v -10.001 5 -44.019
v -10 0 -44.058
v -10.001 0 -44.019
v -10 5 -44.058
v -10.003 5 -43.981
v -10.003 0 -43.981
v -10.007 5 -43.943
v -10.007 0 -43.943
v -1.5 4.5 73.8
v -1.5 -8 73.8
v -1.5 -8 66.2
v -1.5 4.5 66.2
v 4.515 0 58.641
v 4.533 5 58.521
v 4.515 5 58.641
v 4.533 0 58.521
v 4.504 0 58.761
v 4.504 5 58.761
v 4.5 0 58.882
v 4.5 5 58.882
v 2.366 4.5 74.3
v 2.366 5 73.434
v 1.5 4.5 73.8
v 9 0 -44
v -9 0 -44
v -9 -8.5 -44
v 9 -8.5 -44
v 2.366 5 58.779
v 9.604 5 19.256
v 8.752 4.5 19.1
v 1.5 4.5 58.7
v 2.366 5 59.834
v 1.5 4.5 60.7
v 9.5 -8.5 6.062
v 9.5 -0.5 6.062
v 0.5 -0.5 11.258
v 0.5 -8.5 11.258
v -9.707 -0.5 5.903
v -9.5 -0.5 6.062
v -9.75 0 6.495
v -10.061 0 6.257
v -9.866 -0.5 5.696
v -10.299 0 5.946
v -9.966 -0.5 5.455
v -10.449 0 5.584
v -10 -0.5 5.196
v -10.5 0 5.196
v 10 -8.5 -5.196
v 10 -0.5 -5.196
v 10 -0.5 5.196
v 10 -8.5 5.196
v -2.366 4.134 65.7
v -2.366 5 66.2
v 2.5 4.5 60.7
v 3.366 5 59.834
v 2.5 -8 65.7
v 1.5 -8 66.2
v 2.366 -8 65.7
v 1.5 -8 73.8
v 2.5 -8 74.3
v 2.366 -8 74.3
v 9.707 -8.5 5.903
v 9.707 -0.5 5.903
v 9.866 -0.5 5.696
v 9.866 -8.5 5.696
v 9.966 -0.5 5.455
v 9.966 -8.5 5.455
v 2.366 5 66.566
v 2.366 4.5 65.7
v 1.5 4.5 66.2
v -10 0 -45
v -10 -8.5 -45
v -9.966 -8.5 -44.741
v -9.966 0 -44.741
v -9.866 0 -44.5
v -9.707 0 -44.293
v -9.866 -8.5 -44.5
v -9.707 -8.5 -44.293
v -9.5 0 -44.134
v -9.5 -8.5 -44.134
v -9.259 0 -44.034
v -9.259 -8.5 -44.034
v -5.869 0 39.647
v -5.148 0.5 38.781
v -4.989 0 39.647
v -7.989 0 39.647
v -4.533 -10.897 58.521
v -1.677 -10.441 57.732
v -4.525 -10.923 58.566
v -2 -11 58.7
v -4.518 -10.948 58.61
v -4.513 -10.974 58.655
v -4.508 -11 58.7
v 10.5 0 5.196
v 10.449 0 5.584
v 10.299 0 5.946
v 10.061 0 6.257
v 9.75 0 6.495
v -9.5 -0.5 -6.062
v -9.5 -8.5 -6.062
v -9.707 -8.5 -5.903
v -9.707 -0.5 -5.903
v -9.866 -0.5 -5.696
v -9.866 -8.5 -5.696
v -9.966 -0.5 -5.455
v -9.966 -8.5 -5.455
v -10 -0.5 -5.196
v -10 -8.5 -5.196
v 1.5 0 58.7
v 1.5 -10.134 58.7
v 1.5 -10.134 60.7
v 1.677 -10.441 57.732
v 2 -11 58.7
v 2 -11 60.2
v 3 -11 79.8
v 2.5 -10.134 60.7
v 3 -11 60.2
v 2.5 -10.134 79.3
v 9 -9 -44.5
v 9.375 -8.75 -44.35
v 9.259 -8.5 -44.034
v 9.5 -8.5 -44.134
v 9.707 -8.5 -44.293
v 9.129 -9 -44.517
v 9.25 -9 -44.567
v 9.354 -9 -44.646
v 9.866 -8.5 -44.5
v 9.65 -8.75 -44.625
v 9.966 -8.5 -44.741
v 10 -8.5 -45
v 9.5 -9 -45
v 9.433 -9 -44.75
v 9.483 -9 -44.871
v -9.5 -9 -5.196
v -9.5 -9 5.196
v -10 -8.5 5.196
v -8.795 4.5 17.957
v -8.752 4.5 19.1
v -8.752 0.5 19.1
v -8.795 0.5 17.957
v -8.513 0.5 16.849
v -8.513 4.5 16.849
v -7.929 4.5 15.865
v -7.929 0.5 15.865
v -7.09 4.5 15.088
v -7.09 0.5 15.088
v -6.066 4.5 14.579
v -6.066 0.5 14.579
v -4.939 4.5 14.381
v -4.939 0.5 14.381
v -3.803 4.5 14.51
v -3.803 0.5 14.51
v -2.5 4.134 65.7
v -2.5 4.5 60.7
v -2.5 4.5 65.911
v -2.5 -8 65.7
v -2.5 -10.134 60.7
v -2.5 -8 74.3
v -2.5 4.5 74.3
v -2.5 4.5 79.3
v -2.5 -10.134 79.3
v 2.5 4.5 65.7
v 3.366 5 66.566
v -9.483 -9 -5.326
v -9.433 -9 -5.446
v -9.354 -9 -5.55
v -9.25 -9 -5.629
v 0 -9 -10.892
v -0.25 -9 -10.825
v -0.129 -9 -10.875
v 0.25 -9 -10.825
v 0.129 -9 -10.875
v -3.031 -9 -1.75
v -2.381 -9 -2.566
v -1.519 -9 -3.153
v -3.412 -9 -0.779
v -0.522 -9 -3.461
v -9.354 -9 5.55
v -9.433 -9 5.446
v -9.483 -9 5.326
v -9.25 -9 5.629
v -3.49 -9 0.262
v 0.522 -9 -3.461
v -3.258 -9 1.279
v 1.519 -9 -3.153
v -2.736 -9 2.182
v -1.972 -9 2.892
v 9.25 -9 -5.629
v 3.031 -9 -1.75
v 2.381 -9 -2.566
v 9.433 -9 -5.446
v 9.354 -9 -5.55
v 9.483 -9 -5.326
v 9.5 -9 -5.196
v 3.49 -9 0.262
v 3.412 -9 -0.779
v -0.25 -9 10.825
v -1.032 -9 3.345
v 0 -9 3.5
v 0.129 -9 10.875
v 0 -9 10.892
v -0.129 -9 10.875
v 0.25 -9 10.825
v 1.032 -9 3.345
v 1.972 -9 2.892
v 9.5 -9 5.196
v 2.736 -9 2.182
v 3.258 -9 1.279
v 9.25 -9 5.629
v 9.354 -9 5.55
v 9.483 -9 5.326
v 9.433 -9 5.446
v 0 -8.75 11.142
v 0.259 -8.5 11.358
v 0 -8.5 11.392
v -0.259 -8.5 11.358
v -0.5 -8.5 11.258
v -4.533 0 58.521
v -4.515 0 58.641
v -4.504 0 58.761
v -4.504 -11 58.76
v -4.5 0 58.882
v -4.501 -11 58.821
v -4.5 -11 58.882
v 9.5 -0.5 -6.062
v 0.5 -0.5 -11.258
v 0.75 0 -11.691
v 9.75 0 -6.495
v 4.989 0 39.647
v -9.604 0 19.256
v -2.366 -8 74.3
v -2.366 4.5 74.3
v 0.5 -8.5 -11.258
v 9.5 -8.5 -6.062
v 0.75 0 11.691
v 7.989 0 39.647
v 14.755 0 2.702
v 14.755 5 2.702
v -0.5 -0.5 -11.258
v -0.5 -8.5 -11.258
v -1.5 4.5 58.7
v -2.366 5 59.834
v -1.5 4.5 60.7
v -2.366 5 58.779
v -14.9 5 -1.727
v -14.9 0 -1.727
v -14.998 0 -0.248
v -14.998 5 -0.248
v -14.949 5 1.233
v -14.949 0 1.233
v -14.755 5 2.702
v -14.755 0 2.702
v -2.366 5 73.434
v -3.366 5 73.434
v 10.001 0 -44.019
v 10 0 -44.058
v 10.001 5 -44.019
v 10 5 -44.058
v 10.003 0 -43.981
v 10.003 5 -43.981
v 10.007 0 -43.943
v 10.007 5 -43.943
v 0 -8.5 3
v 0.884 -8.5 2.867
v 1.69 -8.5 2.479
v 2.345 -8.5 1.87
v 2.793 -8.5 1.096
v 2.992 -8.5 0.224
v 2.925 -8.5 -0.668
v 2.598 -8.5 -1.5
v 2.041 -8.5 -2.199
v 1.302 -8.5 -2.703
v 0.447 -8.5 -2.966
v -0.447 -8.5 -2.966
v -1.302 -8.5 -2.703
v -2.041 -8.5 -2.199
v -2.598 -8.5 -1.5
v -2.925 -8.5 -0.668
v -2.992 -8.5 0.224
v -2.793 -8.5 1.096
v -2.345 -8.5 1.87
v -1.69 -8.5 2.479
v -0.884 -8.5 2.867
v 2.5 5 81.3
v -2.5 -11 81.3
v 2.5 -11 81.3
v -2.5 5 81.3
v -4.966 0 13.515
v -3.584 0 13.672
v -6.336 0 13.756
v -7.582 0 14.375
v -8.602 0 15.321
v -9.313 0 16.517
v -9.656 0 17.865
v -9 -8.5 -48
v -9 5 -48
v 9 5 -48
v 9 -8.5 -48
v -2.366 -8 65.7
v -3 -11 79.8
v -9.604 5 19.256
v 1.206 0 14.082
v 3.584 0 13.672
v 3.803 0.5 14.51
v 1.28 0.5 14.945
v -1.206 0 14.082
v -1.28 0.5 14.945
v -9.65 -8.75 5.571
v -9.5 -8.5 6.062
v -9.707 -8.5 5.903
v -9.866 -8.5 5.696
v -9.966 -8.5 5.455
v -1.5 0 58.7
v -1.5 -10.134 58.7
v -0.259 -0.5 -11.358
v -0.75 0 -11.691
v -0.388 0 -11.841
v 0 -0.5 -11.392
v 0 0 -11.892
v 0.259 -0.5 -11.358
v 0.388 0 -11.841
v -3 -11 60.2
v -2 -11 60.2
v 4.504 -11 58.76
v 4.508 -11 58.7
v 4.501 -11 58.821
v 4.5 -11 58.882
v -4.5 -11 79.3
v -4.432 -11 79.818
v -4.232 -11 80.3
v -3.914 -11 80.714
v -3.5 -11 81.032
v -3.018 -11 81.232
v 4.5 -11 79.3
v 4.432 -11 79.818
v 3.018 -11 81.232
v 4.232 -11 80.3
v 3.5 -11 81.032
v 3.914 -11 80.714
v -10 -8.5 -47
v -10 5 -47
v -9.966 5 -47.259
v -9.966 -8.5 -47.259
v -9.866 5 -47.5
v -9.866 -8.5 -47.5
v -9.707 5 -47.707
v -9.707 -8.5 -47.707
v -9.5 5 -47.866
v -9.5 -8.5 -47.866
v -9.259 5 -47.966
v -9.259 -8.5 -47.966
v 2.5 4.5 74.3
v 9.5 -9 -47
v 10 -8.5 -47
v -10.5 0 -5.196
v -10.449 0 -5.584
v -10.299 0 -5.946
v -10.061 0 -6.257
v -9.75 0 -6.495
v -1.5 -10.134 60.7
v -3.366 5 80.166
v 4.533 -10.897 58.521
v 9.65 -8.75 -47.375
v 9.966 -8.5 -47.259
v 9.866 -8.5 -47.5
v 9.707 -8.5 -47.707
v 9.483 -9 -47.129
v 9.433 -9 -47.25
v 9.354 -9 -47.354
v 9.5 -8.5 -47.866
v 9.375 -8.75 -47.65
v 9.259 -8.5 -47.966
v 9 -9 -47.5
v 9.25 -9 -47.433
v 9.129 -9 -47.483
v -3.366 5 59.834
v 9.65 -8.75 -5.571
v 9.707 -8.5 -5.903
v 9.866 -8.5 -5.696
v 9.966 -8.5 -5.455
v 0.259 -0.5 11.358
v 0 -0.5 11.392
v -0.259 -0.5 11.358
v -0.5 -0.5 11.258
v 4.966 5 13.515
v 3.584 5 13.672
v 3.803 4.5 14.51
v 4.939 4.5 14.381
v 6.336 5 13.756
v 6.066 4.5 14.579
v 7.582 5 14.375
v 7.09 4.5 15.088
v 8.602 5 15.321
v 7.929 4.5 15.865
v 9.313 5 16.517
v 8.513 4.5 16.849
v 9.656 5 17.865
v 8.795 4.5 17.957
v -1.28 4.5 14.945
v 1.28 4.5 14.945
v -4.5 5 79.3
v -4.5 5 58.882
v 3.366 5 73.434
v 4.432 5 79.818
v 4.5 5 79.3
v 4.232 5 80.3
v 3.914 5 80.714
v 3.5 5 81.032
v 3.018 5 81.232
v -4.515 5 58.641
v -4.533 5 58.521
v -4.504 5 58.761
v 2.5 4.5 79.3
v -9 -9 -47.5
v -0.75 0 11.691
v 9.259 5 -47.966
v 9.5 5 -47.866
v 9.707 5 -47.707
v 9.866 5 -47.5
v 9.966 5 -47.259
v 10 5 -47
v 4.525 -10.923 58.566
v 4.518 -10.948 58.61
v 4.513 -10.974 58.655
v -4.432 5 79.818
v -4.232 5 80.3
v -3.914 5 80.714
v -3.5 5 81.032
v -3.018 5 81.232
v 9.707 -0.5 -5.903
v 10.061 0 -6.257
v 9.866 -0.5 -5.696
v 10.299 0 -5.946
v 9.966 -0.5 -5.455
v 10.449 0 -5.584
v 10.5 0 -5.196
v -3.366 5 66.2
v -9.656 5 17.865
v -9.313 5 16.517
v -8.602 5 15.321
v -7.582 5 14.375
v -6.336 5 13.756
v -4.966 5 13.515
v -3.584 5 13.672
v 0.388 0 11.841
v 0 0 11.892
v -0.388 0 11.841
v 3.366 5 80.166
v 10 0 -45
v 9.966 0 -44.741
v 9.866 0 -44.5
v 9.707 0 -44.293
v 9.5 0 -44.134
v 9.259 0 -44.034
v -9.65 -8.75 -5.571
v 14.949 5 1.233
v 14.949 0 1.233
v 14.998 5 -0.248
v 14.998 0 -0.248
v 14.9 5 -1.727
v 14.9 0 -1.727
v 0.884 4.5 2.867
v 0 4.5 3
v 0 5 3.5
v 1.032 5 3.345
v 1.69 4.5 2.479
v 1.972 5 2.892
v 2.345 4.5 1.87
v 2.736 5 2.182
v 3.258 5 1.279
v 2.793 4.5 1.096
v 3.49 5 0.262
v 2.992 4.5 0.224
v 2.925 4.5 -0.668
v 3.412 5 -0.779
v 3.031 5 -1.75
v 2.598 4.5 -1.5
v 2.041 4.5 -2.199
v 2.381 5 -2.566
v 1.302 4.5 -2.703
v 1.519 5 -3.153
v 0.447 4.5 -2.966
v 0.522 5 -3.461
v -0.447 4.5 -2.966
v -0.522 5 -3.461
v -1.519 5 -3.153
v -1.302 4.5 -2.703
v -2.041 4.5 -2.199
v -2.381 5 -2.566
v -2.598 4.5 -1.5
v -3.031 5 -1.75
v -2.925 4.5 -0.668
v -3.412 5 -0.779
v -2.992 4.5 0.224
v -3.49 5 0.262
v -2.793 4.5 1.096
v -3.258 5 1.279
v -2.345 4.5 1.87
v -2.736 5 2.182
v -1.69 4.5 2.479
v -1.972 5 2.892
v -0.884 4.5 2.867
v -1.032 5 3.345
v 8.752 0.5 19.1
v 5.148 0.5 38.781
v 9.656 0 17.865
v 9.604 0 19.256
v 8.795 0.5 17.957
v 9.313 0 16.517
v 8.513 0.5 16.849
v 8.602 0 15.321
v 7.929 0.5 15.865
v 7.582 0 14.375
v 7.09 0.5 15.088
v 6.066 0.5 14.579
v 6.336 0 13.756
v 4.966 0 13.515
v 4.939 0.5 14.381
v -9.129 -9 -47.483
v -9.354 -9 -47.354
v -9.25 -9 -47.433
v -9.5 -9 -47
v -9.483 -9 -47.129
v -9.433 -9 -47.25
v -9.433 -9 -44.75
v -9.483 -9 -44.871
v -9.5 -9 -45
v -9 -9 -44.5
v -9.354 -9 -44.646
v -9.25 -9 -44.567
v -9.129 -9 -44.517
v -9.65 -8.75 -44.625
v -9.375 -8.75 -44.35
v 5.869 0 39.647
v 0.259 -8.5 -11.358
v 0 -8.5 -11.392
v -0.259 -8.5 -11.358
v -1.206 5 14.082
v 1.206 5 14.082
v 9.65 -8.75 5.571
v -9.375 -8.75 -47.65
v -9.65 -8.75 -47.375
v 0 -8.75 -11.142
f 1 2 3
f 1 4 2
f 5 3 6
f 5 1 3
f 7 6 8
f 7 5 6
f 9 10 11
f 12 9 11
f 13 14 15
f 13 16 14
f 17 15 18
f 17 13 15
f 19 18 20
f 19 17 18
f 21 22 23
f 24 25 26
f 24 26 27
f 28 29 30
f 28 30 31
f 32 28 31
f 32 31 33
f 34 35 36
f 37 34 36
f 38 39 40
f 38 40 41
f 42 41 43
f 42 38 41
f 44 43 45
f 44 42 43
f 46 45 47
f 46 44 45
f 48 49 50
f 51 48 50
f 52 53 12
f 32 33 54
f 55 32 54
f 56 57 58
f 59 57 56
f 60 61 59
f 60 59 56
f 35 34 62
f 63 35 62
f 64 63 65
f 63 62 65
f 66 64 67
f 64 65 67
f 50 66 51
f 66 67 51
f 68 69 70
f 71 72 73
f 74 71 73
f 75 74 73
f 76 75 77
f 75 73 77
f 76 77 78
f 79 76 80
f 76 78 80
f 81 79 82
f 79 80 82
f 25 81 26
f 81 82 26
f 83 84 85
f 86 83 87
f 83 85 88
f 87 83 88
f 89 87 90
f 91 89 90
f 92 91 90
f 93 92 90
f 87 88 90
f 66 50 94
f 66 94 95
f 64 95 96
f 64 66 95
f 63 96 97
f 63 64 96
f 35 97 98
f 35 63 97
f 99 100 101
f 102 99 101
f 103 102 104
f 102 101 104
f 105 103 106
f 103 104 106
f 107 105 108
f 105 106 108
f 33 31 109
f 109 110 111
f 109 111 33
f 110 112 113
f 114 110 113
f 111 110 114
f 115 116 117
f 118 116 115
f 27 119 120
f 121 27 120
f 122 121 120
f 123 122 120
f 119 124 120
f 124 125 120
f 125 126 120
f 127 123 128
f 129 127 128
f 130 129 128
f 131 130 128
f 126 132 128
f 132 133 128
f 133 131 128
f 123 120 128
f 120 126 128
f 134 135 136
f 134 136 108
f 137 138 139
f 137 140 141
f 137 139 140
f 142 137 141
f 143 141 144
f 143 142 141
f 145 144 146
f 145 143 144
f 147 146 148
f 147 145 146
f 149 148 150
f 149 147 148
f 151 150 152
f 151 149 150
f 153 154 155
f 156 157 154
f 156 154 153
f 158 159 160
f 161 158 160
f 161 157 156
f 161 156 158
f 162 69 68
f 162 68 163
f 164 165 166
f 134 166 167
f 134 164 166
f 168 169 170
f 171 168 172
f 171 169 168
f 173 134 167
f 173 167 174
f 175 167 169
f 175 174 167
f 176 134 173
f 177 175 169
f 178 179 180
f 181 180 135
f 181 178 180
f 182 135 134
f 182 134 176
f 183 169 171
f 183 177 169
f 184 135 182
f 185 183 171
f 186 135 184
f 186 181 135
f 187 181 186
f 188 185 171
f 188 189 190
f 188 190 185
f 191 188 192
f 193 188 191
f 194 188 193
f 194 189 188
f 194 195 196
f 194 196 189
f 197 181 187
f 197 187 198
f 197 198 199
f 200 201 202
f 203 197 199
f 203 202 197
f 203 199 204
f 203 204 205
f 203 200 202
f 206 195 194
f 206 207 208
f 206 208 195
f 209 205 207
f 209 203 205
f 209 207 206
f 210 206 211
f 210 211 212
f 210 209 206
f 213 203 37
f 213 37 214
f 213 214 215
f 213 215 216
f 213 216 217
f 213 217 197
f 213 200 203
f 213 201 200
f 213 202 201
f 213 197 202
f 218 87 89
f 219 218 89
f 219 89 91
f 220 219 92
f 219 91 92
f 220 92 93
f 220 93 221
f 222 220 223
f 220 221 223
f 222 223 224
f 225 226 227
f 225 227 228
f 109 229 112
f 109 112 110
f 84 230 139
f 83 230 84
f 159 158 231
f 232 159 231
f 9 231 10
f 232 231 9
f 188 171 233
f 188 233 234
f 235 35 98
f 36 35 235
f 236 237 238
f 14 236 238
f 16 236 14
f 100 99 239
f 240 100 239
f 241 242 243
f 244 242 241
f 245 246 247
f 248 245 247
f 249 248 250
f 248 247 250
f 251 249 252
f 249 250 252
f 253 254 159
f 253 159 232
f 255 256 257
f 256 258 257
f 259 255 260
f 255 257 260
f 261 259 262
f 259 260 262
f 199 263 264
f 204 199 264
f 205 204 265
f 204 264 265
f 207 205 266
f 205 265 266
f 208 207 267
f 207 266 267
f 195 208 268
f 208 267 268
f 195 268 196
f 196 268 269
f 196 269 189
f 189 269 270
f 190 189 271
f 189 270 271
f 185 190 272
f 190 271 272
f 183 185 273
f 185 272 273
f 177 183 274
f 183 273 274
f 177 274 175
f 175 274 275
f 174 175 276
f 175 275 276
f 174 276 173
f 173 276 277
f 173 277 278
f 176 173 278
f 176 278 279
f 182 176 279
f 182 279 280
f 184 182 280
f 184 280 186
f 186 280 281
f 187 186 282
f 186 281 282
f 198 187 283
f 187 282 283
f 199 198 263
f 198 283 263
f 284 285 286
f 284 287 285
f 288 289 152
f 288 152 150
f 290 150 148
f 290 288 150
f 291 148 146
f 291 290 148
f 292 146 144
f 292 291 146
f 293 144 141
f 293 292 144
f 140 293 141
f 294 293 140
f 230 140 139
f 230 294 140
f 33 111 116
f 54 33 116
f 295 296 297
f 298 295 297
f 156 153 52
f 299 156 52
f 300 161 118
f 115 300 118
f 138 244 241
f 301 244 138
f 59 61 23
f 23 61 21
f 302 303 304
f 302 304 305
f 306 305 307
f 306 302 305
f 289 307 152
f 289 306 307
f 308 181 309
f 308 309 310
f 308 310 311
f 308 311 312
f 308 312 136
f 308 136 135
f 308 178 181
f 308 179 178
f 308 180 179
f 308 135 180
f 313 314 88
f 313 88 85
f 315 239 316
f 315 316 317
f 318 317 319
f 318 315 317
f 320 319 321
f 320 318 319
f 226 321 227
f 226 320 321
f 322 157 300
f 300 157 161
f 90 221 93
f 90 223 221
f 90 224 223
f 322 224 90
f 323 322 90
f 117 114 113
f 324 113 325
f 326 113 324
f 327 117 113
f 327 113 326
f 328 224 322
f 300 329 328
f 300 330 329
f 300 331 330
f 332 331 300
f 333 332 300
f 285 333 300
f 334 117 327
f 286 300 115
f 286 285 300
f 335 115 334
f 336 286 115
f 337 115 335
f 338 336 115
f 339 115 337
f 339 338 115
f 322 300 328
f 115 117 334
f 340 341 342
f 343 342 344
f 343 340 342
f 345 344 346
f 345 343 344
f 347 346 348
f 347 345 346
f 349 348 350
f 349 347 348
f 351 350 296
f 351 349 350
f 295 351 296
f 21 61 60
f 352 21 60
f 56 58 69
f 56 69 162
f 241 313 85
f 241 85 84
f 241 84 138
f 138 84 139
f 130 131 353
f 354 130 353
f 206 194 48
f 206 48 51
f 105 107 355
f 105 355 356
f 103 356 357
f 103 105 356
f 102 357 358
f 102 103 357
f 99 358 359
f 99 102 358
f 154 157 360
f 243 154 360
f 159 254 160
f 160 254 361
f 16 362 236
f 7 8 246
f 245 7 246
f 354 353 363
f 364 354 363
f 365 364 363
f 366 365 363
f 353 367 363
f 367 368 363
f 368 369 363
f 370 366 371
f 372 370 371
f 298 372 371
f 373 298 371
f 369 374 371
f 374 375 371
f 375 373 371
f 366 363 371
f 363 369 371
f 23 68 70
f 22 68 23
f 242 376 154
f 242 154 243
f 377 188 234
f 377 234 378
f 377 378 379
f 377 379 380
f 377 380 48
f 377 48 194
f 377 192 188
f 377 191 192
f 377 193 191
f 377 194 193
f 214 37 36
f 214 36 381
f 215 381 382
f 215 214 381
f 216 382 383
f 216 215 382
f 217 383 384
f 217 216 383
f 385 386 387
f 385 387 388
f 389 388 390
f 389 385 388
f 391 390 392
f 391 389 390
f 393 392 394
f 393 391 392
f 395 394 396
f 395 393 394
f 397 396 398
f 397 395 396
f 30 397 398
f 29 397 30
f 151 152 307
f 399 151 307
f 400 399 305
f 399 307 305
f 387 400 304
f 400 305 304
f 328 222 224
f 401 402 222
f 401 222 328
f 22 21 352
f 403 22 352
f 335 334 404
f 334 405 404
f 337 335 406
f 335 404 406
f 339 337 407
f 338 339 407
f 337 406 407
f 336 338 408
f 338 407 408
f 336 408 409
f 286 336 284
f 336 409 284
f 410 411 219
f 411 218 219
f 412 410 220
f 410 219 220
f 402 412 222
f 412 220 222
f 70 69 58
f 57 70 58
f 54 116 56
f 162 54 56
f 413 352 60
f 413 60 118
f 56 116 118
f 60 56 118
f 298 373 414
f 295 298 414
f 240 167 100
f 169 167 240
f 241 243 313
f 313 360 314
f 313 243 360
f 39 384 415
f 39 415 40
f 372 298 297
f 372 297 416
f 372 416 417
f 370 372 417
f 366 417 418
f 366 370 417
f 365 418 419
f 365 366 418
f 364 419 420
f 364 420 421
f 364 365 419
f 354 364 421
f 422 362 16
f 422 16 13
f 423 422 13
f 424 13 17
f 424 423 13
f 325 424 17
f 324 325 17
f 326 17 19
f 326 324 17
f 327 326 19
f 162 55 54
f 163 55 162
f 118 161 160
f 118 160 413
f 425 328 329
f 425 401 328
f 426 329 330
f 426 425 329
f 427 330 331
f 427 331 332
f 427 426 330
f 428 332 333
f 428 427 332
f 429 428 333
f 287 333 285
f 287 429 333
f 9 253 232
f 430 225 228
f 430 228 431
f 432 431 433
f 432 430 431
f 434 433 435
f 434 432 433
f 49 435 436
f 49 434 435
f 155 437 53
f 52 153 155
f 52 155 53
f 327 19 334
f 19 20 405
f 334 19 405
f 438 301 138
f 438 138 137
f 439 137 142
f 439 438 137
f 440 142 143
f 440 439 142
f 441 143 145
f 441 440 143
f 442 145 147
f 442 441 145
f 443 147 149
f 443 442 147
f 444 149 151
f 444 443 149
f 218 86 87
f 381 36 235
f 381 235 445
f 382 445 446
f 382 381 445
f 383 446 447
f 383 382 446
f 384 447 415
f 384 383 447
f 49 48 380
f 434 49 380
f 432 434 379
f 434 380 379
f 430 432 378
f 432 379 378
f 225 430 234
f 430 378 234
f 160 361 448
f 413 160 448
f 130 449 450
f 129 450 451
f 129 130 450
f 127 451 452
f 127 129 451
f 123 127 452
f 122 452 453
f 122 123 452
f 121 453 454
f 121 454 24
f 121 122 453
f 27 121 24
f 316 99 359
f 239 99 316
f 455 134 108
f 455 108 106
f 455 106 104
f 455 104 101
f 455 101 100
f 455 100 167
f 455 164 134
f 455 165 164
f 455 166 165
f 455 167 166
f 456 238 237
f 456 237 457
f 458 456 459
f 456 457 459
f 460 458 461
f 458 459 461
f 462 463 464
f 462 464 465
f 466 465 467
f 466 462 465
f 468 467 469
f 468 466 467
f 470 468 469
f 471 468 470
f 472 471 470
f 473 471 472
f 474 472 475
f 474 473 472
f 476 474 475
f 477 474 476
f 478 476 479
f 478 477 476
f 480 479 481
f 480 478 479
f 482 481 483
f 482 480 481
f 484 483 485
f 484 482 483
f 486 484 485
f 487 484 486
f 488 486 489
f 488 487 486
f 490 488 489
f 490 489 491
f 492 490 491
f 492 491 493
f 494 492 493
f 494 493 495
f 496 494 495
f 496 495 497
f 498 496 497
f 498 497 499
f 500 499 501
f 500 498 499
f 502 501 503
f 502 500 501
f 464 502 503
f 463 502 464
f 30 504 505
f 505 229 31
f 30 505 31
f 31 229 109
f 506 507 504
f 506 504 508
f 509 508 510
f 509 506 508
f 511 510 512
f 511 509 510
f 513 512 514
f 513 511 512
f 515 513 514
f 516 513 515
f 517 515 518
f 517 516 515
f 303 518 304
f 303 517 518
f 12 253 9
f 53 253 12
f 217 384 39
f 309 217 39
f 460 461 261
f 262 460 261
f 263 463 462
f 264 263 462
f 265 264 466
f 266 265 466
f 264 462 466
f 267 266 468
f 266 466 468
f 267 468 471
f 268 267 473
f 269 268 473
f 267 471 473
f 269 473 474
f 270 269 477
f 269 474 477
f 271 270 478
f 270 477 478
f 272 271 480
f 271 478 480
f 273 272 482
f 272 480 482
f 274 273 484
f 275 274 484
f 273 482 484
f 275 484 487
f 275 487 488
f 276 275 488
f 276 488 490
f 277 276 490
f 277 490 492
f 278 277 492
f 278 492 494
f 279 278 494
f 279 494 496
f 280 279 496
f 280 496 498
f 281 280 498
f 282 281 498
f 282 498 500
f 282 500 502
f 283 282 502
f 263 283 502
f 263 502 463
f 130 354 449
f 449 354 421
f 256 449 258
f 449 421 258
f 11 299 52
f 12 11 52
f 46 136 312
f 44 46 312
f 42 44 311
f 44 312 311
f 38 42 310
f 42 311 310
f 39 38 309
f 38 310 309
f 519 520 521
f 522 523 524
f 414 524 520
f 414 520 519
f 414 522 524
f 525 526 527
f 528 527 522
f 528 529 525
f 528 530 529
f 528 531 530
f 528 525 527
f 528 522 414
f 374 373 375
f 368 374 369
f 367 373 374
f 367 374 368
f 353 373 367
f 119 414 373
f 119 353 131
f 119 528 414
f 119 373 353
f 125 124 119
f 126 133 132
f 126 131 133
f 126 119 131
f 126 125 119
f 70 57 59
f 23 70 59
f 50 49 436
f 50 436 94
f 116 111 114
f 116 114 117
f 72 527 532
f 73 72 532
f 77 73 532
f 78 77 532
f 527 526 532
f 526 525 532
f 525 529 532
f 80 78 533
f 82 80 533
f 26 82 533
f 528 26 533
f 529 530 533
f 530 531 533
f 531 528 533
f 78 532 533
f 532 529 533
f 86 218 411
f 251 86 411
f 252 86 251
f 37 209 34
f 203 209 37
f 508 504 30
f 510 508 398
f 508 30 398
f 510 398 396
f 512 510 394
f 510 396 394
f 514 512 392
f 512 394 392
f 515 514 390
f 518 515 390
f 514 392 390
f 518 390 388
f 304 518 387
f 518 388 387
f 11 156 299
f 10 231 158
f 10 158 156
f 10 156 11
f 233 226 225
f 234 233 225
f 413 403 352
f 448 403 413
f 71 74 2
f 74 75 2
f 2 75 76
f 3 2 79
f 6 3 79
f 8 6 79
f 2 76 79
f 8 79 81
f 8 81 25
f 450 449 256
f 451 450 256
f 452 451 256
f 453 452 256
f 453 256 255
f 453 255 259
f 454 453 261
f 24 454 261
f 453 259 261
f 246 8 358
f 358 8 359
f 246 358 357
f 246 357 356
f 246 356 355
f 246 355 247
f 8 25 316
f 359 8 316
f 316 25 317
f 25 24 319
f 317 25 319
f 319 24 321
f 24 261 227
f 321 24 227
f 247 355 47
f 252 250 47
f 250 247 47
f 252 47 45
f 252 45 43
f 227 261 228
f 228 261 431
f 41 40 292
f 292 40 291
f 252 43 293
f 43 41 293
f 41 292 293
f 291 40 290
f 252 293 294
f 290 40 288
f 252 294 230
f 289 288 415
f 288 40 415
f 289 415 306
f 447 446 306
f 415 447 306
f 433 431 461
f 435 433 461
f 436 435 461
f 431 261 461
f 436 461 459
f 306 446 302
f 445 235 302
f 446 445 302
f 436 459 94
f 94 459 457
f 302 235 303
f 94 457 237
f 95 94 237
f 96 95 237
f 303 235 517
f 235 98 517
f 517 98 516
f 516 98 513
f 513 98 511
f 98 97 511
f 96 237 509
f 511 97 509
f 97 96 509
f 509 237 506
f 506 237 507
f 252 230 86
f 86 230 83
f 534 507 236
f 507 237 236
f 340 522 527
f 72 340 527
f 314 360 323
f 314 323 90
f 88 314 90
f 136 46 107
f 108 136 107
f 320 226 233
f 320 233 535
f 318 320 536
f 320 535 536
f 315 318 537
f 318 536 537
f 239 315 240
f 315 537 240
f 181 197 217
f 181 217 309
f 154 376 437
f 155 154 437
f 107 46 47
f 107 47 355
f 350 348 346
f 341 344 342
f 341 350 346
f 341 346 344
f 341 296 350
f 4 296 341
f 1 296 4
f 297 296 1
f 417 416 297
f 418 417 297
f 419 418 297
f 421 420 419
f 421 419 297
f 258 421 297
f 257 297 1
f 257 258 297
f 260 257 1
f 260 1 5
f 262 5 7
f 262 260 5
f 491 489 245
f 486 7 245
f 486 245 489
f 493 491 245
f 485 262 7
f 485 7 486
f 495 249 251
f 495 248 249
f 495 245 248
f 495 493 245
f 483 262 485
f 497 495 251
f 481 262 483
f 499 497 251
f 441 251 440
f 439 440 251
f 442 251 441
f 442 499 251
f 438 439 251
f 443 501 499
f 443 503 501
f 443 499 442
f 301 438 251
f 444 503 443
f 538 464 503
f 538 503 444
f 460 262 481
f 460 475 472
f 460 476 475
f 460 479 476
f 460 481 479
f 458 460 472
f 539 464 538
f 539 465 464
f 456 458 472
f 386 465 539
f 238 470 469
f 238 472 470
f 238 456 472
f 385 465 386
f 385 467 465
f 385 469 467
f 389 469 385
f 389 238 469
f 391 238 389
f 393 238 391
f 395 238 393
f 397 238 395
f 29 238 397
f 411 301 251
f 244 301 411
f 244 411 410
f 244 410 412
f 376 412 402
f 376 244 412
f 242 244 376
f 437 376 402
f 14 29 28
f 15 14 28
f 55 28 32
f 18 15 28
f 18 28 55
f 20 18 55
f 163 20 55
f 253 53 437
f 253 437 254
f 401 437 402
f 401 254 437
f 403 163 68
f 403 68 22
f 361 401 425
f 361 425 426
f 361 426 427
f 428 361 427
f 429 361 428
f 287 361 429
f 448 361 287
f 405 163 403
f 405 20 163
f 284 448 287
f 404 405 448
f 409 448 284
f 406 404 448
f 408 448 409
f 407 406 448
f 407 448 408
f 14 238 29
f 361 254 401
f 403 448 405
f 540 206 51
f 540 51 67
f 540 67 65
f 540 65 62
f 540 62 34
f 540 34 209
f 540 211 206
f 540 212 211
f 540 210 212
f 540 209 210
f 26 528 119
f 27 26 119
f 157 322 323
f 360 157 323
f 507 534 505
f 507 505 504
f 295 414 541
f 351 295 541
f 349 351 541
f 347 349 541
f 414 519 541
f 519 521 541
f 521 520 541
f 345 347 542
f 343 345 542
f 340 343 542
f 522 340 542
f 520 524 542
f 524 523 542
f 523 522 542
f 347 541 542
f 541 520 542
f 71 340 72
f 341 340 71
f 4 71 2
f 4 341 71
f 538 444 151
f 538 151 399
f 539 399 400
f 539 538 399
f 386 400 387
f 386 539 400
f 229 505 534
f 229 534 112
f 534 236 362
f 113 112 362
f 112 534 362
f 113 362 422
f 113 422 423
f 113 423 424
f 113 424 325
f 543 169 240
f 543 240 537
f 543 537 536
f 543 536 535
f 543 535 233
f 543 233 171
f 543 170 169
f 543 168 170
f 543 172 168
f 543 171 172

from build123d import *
from OCP.BRepFilletAPI import BRepFilletAPI_MakeChamfer

# Parameters (mm, degrees)
SKETCH1_R           = 15
BOSS_EXTRUDE1_DEPTH = 5
BOSS_EXTRUDE2_DEPTH = 9
CUT_EXTRUDE1_REACH  = 27.417
SKETCH3_R           = 3
FILLET1_R           = 1
CHAMFER1_SIZE       = 0.5
BOSS_EXTRUDE3_START = -5
BOSS_EXTRUDE3_DEPTH = 5
SKETCH5_W           = 20
SKETCH5_H           = 4
BOSS_EXTRUDE4_DEPTH = 9
FILLET2_R           = 1
CHAMFER3_SIZE       = 0.5
FILLET3_R           = 1
BOSS_EXTRUDE5_START = -5
BOSS_EXTRUDE5_DEPTH = 5
SKETCH7_W           = 9
SKETCH7_H           = 22.6
BOSS_EXTRUDE6_DEPTH = 11
SKETCH8_W           = 5
SKETCH8_H           = 18.6
CUT_EXTRUDE2_DEPTH  = 3
CUT_EXTRUDE4_REACH  = 85.688
SKETCH10_W          = 5
SKETCH10_H          = 5
CUT_EXTRUDE5_DEPTH  = 16
CHAMFER5_SIZE       = 19.052558883
CHAMFER5_SIZE_2     = 11
FILLET4_R           = 4
CHAMFER6_SIZE       = 0.5
CHAMFER6_SIZE2      = 0.866025404
FILLET5_R           = 2


with BuildPart() as part:
    # Sketch1 → Boss-Extrude1 (new body)
    with BuildSketch(Plane(origin=(0, 0, 0), x_dir=(1, 0, 0), z_dir=(0, 1, 0))):
        with Locations(Location((0, 0, 0), (0, 0, 270))):
            Circle(SKETCH1_R)
    extrude(amount=BOSS_EXTRUDE1_DEPTH)

    # Sketch2 → Boss-Extrude2 (add)
    with BuildSketch(Plane.XZ):
        Polygon((0, 11.547005384), (-10, 5.773502692), (-10, -5.773502692), (0, -11.547005384), (10, -5.773502692), (10, 5.773502692), align=None)
    extrude(amount=BOSS_EXTRUDE2_DEPTH)

    # Sketch3 → Cut-Extrude1 (cut, up to next)
    with BuildSketch(Plane(origin=(0, 5, 0), x_dir=(1, 0, 0), z_dir=(0, 1, 0)), mode=Mode.PRIVATE) as cut_extrude1_sk1:
        with Locations(Location((0, 0, 0), (0, 0, 270))):
            Circle(SKETCH3_R)
    cut_extrude1_tool1 = extrude(cut_extrude1_sk1.sketch, amount=-CUT_EXTRUDE1_REACH, mode=Mode.PRIVATE) & part.part
    add(cut_extrude1_tool1.solids().sort_by_distance((0, 5, 0))[0], mode=Mode.SUBTRACT)

    # Fillet1
    fillet1_edges = [part.edges().sort_by_distance(p)[0] for p in [
        (10, -4.5, 5.773502692),
        (0, -4.5, 11.547005384),
        (-10, -4.5, 5.773502692),
        (-10, -4.5, -5.773502692),
        (0, -4.5, -11.547005384),
        (10, -4.5, -5.773502692),
    ]]
    fillet(fillet1_edges, radius=FILLET1_R)

    # Chamfer1
    chamfer1_edges = [part.edges().sort_by_distance(p)[0] for p in [
        (0, -9, -3),
        (0, 5, -3),
        (-5, 0, -8.660254038),
        (-5, -9, -8.660254038),
        (-10, 0, 0),
        (-10, -9, 0),
        (5, -9, 8.660254038),
        (-5, -9, 8.660254038),
        (5, -9, -8.660254038),
        (10, -9, 0),
        (-9.866025404, -9, 5.696152423),
        (0, -9, 11.392304845),
        (9.866025404, -9, 5.696152423),
        (9.866025404, -9, -5.696152423),
        (0, -9, -11.392304845),
        (-9.866025404, -9, -5.696152423),
        (5, 0, -8.660254038),
        (10, 0, 0),
        (5, 0, 8.660254038),
        (-5, 0, 8.660254038),
        (-9.866025404, 0, -5.696152423),
        (0, 0, -11.392304845),
        (9.866025404, 0, -5.696152423),
        (9.866025404, 0, 5.696152423),
        (0, 0, 11.392304845),
        (-9.866025404, 0, 5.696152423),
    ]]
    chamfer(chamfer1_edges, length=CHAMFER1_SIZE)

    # Sketch4 → Boss-Extrude3 (add)
    with BuildSketch(Plane(origin=(0, 5, 0), x_dir=(1, 0, 0), z_dir=(0, 1, 0)).offset(BOSS_EXTRUDE3_START)):
        with BuildLine():
            Line((10, 48), (-10, 48))
            Line((-10, 48), (-10, 44))
            Line((-10, 44), (-14.900225018, 1.727221587))
            ThreePointArc((-14.900225018, 1.727221587), (0, 15), (14.900225018, 1.727221587))
            Line((14.900225018, 1.727221587), (10, 44))
            Line((10, 44), (10, 48))
        make_face()
    extrude(amount=BOSS_EXTRUDE3_DEPTH)

    # Sketch5 → Boss-Extrude4 (add)
    with BuildSketch(Plane.XZ):
        with Locations((0, -46)):
            Rectangle(SKETCH5_W, SKETCH5_H)
    extrude(amount=BOSS_EXTRUDE4_DEPTH)

    # Fillet2
    fillet2_edges = [part.edges().sort_by_distance(p)[0] for p in [
        (-10, -2, -48),
        (10, -2, -48),
        (-10, -4.5, -44),
        (10, -4.5, -44),
    ]]
    fillet(fillet2_edges, radius=FILLET2_R)

    # Chamfer3
    chamfer3_edges = [part.edges().sort_by_distance(p)[0] for p in [
        (-10, -9, -46),
        (0, -9, -44),
        (0, -9, -48),
        (10, -9, -46),
        (-9.707106781, -9, -47.707106781),
        (9.707106781, -9, -47.707106781),
        (9.707106781, -9, -44.292893219),
        (-9.707106781, -9, -44.292893219),
    ]]
    chamfer(chamfer3_edges, length=CHAMFER3_SIZE)

    # Fillet3
    fillet3_edges = [part.edges().sort_by_distance(p)[0] for p in [
        (-10, 2.5, -44),
        (10, 2.5, -44),
    ]]
    fillet(fillet3_edges, radius=FILLET3_R)

    # Sketch6 → Boss-Extrude5 (add)
    with BuildSketch(Plane(origin=(0, 5, 0), x_dir=(1, 0, 0), z_dir=(0, 1, 0)).offset(BOSS_EXTRUDE5_START)):
        with BuildLine():
            Line((4.5, -58.7), (4.5, -81.3))
            Line((4.5, -81.3), (-4.5, -81.3))
            Line((-4.5, -81.3), (-4.5, -58.7))
            Line((-4.5, -58.7), (-14.754643314, -2.701943869))
            ThreePointArc((-14.754643314, -2.701943869), (0, -15), (14.754643314, -2.701943869))
            Line((14.754643314, -2.701943869), (4.5, -58.7))
        make_face()
    extrude(amount=BOSS_EXTRUDE5_DEPTH)

    # Sketch7 → Boss-Extrude6 (add)
    with BuildSketch(Plane.XZ):
        with Locations((0, 70)):
            Rectangle(SKETCH7_W, SKETCH7_H)
    extrude(amount=BOSS_EXTRUDE6_DEPTH)

    # Sketch8 → Cut-Extrude2 (cut)
    with BuildSketch(Plane.XZ.offset(11)):
        with Locations((0, 70)):
            Rectangle(SKETCH8_W, SKETCH8_H)
    extrude(amount=-CUT_EXTRUDE2_DEPTH, mode=Mode.SUBTRACT)

    # Sketch10 → Cut-Extrude4 (cut, up to next)
    with BuildSketch(Plane.XZ.offset(8), mode=Mode.PRIVATE) as cut_extrude4_sk1:
        with Locations((0, 76.8)):
            Rectangle(SKETCH10_W, SKETCH10_H)
    cut_extrude4_tool1 = extrude(cut_extrude4_sk1.sketch, amount=-CUT_EXTRUDE4_REACH, mode=Mode.PRIVATE) & part.part
    # Sketch10 → Cut-Extrude4 (cut, up to next)
    with BuildSketch(Plane.XZ.offset(8), mode=Mode.PRIVATE) as cut_extrude4_sk2:
        with Locations((0, 63.2)):
            Rectangle(SKETCH10_W, SKETCH10_H)
    cut_extrude4_tool2 = extrude(cut_extrude4_sk2.sketch, amount=-CUT_EXTRUDE4_REACH, mode=Mode.PRIVATE) & part.part
    add(cut_extrude4_tool1.solids().sort_by_distance((0, -8, 76.8))[0], mode=Mode.SUBTRACT)
    add(cut_extrude4_tool2.solids().sort_by_distance((0, -8, 63.2))[0], mode=Mode.SUBTRACT)

    # Sketch11 → Cut-Extrude5 (cut)
    with BuildSketch(Plane.XZ.offset(11)):
        with BuildLine():
            Line((-1.5, 74.3), (-1.5, 58.7))
            Line((-1.5, 58.7), (-10.24267003, 10.958453844))
            ThreePointArc((-10.24267003, 10.958453844), (0, 15), (10.24267003, 10.958453844))
            Line((10.24267003, 10.958453844), (1.5, 58.7))
            Line((1.5, 58.7), (1.5, 74.3))
            Line((1.5, 74.3), (-1.5, 74.3))
        make_face()
    extrude(amount=-CUT_EXTRUDE5_DEPTH, mode=Mode.SUBTRACT)

    # Chamfer5
    # the kernel refuses this chamfer: 19.052558883, 11 mm, written as the material it adds along each edge
    with BuildSketch(Plane(origin=(47.790603676, 0, 58.7), x_dir=(0, 0.01932676561270063, -0.9998132206222079), z_dir=(-1, 0, 0))) as chamfer5_piece_1_section:
        Polygon((CHAMFER5_SIZE * 0.999813220636, CHAMFER5_SIZE * 0.019326765613), (-CHAMFER5_SIZE_2 * 0.0193267656127, CHAMFER5_SIZE_2 * 0.999813220622), (0, 0), align=None)
    chamfer5_piece_1 = extrude(amount=101.581207353, mode=Mode.PRIVATE)
    chamfer5_piece_1 = split(chamfer5_piece_1, bisect_by=Plane(origin=(6.212258684, -2.756527894, 49.349781279), z_dir=(-0.9836428876173074, 0, -0.18012959123887753)), keep=Keep.TOP, mode=Mode.PRIVATE)
    chamfer5_piece_1 = split(chamfer5_piece_1, bisect_by=Plane(origin=(3.309598693, -2.756527894, 48.818231705), z_dir=(0.9836428876173074, 0, 0.18012959123887784)), keep=Keep.TOP, mode=Mode.PRIVATE)
    add(chamfer5_piece_1)
    with BuildSketch(Plane(origin=(47.790603676, 0, 58.7), x_dir=(0, 0.01932676561270063, -0.9998132206222079), z_dir=(-1, 0, 0))) as chamfer5_piece_2_section:
        Polygon((CHAMFER5_SIZE * 0.999813220636, CHAMFER5_SIZE * 0.019326765613), (-CHAMFER5_SIZE_2 * 0.0193267656127, CHAMFER5_SIZE_2 * 0.999813220622), (0, 0), align=None)
    chamfer5_piece_2 = extrude(amount=101.581207353, mode=Mode.PRIVATE)
    chamfer5_piece_2 = split(chamfer5_piece_2, bisect_by=Plane(origin=(-2.334821756, -4.240286921, 54.141246068), z_dir=(-0.9836428876173074, 0, 0.18012959123887784)), keep=Keep.TOP, mode=Mode.PRIVATE)
    chamfer5_piece_2 = split(chamfer5_piece_2, bisect_by=Plane(origin=(-5.237481747, -4.240286921, 54.672795642), z_dir=(0.9836428876173074, 0, -0.18012959123887773)), keep=Keep.TOP, mode=Mode.PRIVATE)
    add(chamfer5_piece_2)
    with BuildSketch(Plane(origin=(53.790603676, 0, 58.7), x_dir=(0, 0.01932676561270063, -0.9998132206222079), z_dir=(-1, 0, 0))) as chamfer5_piece_3_section:
        Polygon((CHAMFER5_SIZE * 0.999813220636, CHAMFER5_SIZE * 0.019326765613), (-CHAMFER5_SIZE_2 * 0.0193267656127, CHAMFER5_SIZE_2 * 0.999813220622), (0, 0), align=None)
    chamfer5_piece_3 = extrude(amount=101.581207353, mode=Mode.PRIVATE)
    chamfer5_piece_3 = split(chamfer5_piece_3, bisect_by=Plane(origin=(6.212258684, -2.756527894, 49.349781279), z_dir=(-0.9836428876173074, 0, -0.18012959123887753)), keep=Keep.TOP, mode=Mode.PRIVATE)
    chamfer5_piece_3 = split(chamfer5_piece_3, bisect_by=Plane(origin=(3.309598693, -2.756527894, 48.818231705), z_dir=(0.9836428876173074, 0, 0.18012959123887784)), keep=Keep.TOP, mode=Mode.PRIVATE)
    add(chamfer5_piece_3)
    with BuildSketch(Plane(origin=(53.790603676, 0, 58.7), x_dir=(0, 0.01932676561270063, -0.9998132206222079), z_dir=(-1, 0, 0))) as chamfer5_piece_4_section:
        Polygon((CHAMFER5_SIZE * 0.999813220636, CHAMFER5_SIZE * 0.019326765613), (-CHAMFER5_SIZE_2 * 0.0193267656127, CHAMFER5_SIZE_2 * 0.999813220622), (0, 0), align=None)
    chamfer5_piece_4 = extrude(amount=101.581207353, mode=Mode.PRIVATE)
    chamfer5_piece_4 = split(chamfer5_piece_4, bisect_by=Plane(origin=(-2.334821756, -4.240286921, 54.141246068), z_dir=(-0.9836428876173074, 0, 0.18012959123887784)), keep=Keep.TOP, mode=Mode.PRIVATE)
    chamfer5_piece_4 = split(chamfer5_piece_4, bisect_by=Plane(origin=(-5.237481747, -4.240286921, 54.672795642), z_dir=(0.9836428876173074, 0, -0.18012959123887773)), keep=Keep.TOP, mode=Mode.PRIVATE)
    add(chamfer5_piece_4)

    # Fillet4
    fillet4_edges = [part.edges().sort_by_distance(p)[0] for p in [
        (10.24267003, 2.5, 10.958453844),
        (-10.24267003, 2.5, 10.958453844),
    ]]
    fillet(fillet4_edges, radius=FILLET4_R)

    # Chamfer6: one chamfer whose edges measure the first distance from different faces: ONE call of the kernel's chamfer builder (chamfer() names one face for all edges)
    chamfer6_edges_1 = [part.edges().sort_by_distance(p)[0] for p in [
        (0, -11, 79.3),
        (-2.5, -11, 70),
        (-2, -11, 60.7),
        (2.5, -11, 70),
        (2, -11, 60.7),
        (-1.5, -11, 59.7),
        (1.5, -11, 59.7),
    ]]
    chamfer6_side_1 = [part.faces().sort_by_distance(p)[0] for p in [
        (-4.256738823, -11, 70),
    ]]
    chamfer6_edges_2 = [part.edges().sort_by_distance(p)[0] for p in [
        (-2.5, 5, 76.8),
        (-2.5, 5, 63.2),
    ]]
    chamfer6_side_2 = [part.faces().sort_by_distance(p)[0] for p in [
        (-2.5, -3, 79.054651269),
    ]]
    chamfer6_edges_3 = [part.edges().sort_by_distance(p)[0] for p in [
        (0, 5, 79.3),
    ]]
    chamfer6_side_3 = [part.faces().sort_by_distance(p)[0] for p in [
        (0, -3, 79.3),
    ]]
    chamfer6_edges_4 = [part.edges().sort_by_distance(p)[0] for p in [
        (2.5, 5, 76.8),
        (2.5, 5, 63.2),
    ]]
    chamfer6_side_4 = [part.faces().sort_by_distance(p)[0] for p in [
        (2.5, -1.5, 74.545348731),
    ]]
    chamfer6_edges_5 = [part.edges().sort_by_distance(p)[0] for p in [
        (-2, 5, 74.3),
    ]]
    chamfer6_side_5 = [part.faces().sort_by_distance(p)[0] for p in [
        (-2, -1.5, 74.3),
    ]]
    chamfer6_edges_6 = [part.edges().sort_by_distance(p)[0] for p in [
        (-2, 5, 60.7),
    ]]
    chamfer6_side_6 = [part.faces().sort_by_distance(p)[0] for p in [
        (-2, -3, 60.7),
    ]]
    chamfer6_edges_7 = [part.edges().sort_by_distance(p)[0] for p in [
        (2, 5, 65.7),
    ]]
    chamfer6_side_7 = [part.faces().sort_by_distance(p)[0] for p in [
        (2, -1.5, 65.7),
    ]]
    chamfer6_edges_8 = [part.edges().sort_by_distance(p)[0] for p in [
        (2, 5, 74.3),
    ]]
    chamfer6_side_8 = [part.faces().sort_by_distance(p)[0] for p in [
        (2, -1.5, 74.3),
    ]]
    chamfer6_edges_9 = [part.edges().sort_by_distance(p)[0] for p in [
        (-2, 5, 65.7),
    ]]
    chamfer6_side_9 = [part.faces().sort_by_distance(p)[0] for p in [
        (6.431537391, 5, 39.138943683),
    ]]
    chamfer6_edges_10 = [part.edges().sort_by_distance(p)[0] for p in [
        (2, 5, 60.7),
    ]]
    chamfer6_side_10 = [part.faces().sort_by_distance(p)[0] for p in [
        (2, -3, 60.7),
    ]]
    chamfer6_edges_11 = [part.edges().sort_by_distance(p)[0] for p in [
        (-5.125902347, 5, 38.899849283),
        (-6.870402149, 0, 29.373569841),
    ]]
    chamfer6_side_11 = [part.faces().sort_by_distance(p)[0] for p in [
        (-4.273546673, 0.365854061, 43.554351583),
    ]]
    chamfer6_edges_12 = [part.edges().sort_by_distance(p)[0] for p in [
        (-1.5, 5, 59.7),
    ]]
    chamfer6_side_12 = [part.faces().sort_by_distance(p)[0] for p in [
        (-1.5, -3, 59.7),
    ]]
    chamfer6_edges_13 = [part.edges().sort_by_distance(p)[0] for p in [
        (1.5, 5, 59.7),
    ]]
    chamfer6_side_13 = [part.faces().sort_by_distance(p)[0] for p in [
        (1.5, -3, 59.7),
    ]]
    chamfer6_edges_14 = [part.edges().sort_by_distance(p)[0] for p in [
        (-1.5, 5, 70),
        (-1.5, -1.5, 65.7),
        (-1.5, -1.5, 74.3),
    ]]
    chamfer6_side_14 = [part.faces().sort_by_distance(p)[0] for p in [
        (-1.5, -1.5, 70),
    ]]
    chamfer6_edges_15 = [part.edges().sort_by_distance(p)[0] for p in [
        (1.5, -1.5, 65.7),
        (1.5, 5, 70),
        (1.5, -1.5, 74.3),
    ]]
    chamfer6_side_15 = [part.faces().sort_by_distance(p)[0] for p in [
        (1.5, -1.5, 70),
    ]]
    chamfer6_edges_16 = [part.edges().sort_by_distance(p)[0] for p in [
        (6.870402149, 0, 29.373569841),
        (5.125902347, 5, 38.899849283),
    ]]
    chamfer6_side_16 = [part.faces().sort_by_distance(p)[0] for p in [
        (4.273546673, 0.365854061, 43.554351583),
    ]]
    chamfer6_edges_17 = [part.edges().sort_by_distance(p)[0] for p in [
        (0, 5, 15),
        (0, 0, 15),
    ]]
    chamfer6_side_17 = [part.faces().sort_by_distance(p)[0] for p in [
        (0, 2.5, 15),
    ]]
    chamfer6_edges_18 = [part.edges().sort_by_distance(p)[0] for p in [
        (7.537310318, 0, 15.44640333),
        (7.537310318, 5, 15.44640333),
    ]]
    chamfer6_side_18 = [part.faces().sort_by_distance(p)[0] for p in [
        (7.537310318, 2.5, 15.44640333),
    ]]
    chamfer6_edges_19 = [part.edges().sort_by_distance(p)[0] for p in [
        (-7.537310318, 0, 15.44640333),
        (-7.537310318, 5, 15.44640333),
    ]]
    chamfer6_side_19 = [part.faces().sort_by_distance(p)[0] for p in [
        (-7.537310318, 2.5, 15.44640333),
    ]]
    chamfer6 = BRepFilletAPI_MakeChamfer(part.part.solid().wrapped)
    for e in chamfer6_edges_1:
        chamfer6.Add(CHAMFER6_SIZE, CHAMFER6_SIZE2, e.wrapped, chamfer6_side_1[0].wrapped)  # the first distance lies on this face
    for e in chamfer6_edges_2:
        chamfer6.Add(CHAMFER6_SIZE, CHAMFER6_SIZE2, e.wrapped, chamfer6_side_2[0].wrapped)  # the first distance lies on this face
    for e in chamfer6_edges_3:
        chamfer6.Add(CHAMFER6_SIZE, CHAMFER6_SIZE2, e.wrapped, chamfer6_side_3[0].wrapped)  # the first distance lies on this face
    for e in chamfer6_edges_4:
        chamfer6.Add(CHAMFER6_SIZE, CHAMFER6_SIZE2, e.wrapped, chamfer6_side_4[0].wrapped)  # the first distance lies on this face
    for e in chamfer6_edges_5:
        chamfer6.Add(CHAMFER6_SIZE, CHAMFER6_SIZE2, e.wrapped, chamfer6_side_5[0].wrapped)  # the first distance lies on this face
    for e in chamfer6_edges_6:
        chamfer6.Add(CHAMFER6_SIZE, CHAMFER6_SIZE2, e.wrapped, chamfer6_side_6[0].wrapped)  # the first distance lies on this face
    for e in chamfer6_edges_7:
        chamfer6.Add(CHAMFER6_SIZE, CHAMFER6_SIZE2, e.wrapped, chamfer6_side_7[0].wrapped)  # the first distance lies on this face
    for e in chamfer6_edges_8:
        chamfer6.Add(CHAMFER6_SIZE, CHAMFER6_SIZE2, e.wrapped, chamfer6_side_8[0].wrapped)  # the first distance lies on this face
    for e in chamfer6_edges_9:
        chamfer6.Add(CHAMFER6_SIZE, CHAMFER6_SIZE2, e.wrapped, chamfer6_side_9[0].wrapped)  # the first distance lies on this face
    for e in chamfer6_edges_10:
        chamfer6.Add(CHAMFER6_SIZE, CHAMFER6_SIZE2, e.wrapped, chamfer6_side_10[0].wrapped)  # the first distance lies on this face
    for e in chamfer6_edges_11:
        chamfer6.Add(CHAMFER6_SIZE, CHAMFER6_SIZE2, e.wrapped, chamfer6_side_11[0].wrapped)  # the first distance lies on this face
    for e in chamfer6_edges_12:
        chamfer6.Add(CHAMFER6_SIZE, CHAMFER6_SIZE2, e.wrapped, chamfer6_side_12[0].wrapped)  # the first distance lies on this face
    for e in chamfer6_edges_13:
        chamfer6.Add(CHAMFER6_SIZE, CHAMFER6_SIZE2, e.wrapped, chamfer6_side_13[0].wrapped)  # the first distance lies on this face
    for e in chamfer6_edges_14:
        chamfer6.Add(CHAMFER6_SIZE, CHAMFER6_SIZE2, e.wrapped, chamfer6_side_14[0].wrapped)  # the first distance lies on this face
    for e in chamfer6_edges_15:
        chamfer6.Add(CHAMFER6_SIZE, CHAMFER6_SIZE2, e.wrapped, chamfer6_side_15[0].wrapped)  # the first distance lies on this face
    for e in chamfer6_edges_16:
        chamfer6.Add(CHAMFER6_SIZE, CHAMFER6_SIZE2, e.wrapped, chamfer6_side_16[0].wrapped)  # the first distance lies on this face
    for e in chamfer6_edges_17:
        chamfer6.Add(CHAMFER6_SIZE, CHAMFER6_SIZE2, e.wrapped, chamfer6_side_17[0].wrapped)  # the first distance lies on this face
    for e in chamfer6_edges_18:
        chamfer6.Add(CHAMFER6_SIZE, CHAMFER6_SIZE2, e.wrapped, chamfer6_side_18[0].wrapped)  # the first distance lies on this face
    for e in chamfer6_edges_19:
        chamfer6.Add(CHAMFER6_SIZE, CHAMFER6_SIZE2, e.wrapped, chamfer6_side_19[0].wrapped)  # the first distance lies on this face
    add(Compound.cast(chamfer6.Shape()), mode=Mode.REPLACE)

    # Fillet5
    fillet5_edges = [part.edges().sort_by_distance(p)[0] for p in [
        (4.5, -3, 81.3),
        (-4.5, -3, 81.3),
        (-4.5, -3, 58.7),
        (4.5, -3, 58.7),
    ]]
    fillet(fillet5_edges, radius=FILLET5_R)


solid = part.part
